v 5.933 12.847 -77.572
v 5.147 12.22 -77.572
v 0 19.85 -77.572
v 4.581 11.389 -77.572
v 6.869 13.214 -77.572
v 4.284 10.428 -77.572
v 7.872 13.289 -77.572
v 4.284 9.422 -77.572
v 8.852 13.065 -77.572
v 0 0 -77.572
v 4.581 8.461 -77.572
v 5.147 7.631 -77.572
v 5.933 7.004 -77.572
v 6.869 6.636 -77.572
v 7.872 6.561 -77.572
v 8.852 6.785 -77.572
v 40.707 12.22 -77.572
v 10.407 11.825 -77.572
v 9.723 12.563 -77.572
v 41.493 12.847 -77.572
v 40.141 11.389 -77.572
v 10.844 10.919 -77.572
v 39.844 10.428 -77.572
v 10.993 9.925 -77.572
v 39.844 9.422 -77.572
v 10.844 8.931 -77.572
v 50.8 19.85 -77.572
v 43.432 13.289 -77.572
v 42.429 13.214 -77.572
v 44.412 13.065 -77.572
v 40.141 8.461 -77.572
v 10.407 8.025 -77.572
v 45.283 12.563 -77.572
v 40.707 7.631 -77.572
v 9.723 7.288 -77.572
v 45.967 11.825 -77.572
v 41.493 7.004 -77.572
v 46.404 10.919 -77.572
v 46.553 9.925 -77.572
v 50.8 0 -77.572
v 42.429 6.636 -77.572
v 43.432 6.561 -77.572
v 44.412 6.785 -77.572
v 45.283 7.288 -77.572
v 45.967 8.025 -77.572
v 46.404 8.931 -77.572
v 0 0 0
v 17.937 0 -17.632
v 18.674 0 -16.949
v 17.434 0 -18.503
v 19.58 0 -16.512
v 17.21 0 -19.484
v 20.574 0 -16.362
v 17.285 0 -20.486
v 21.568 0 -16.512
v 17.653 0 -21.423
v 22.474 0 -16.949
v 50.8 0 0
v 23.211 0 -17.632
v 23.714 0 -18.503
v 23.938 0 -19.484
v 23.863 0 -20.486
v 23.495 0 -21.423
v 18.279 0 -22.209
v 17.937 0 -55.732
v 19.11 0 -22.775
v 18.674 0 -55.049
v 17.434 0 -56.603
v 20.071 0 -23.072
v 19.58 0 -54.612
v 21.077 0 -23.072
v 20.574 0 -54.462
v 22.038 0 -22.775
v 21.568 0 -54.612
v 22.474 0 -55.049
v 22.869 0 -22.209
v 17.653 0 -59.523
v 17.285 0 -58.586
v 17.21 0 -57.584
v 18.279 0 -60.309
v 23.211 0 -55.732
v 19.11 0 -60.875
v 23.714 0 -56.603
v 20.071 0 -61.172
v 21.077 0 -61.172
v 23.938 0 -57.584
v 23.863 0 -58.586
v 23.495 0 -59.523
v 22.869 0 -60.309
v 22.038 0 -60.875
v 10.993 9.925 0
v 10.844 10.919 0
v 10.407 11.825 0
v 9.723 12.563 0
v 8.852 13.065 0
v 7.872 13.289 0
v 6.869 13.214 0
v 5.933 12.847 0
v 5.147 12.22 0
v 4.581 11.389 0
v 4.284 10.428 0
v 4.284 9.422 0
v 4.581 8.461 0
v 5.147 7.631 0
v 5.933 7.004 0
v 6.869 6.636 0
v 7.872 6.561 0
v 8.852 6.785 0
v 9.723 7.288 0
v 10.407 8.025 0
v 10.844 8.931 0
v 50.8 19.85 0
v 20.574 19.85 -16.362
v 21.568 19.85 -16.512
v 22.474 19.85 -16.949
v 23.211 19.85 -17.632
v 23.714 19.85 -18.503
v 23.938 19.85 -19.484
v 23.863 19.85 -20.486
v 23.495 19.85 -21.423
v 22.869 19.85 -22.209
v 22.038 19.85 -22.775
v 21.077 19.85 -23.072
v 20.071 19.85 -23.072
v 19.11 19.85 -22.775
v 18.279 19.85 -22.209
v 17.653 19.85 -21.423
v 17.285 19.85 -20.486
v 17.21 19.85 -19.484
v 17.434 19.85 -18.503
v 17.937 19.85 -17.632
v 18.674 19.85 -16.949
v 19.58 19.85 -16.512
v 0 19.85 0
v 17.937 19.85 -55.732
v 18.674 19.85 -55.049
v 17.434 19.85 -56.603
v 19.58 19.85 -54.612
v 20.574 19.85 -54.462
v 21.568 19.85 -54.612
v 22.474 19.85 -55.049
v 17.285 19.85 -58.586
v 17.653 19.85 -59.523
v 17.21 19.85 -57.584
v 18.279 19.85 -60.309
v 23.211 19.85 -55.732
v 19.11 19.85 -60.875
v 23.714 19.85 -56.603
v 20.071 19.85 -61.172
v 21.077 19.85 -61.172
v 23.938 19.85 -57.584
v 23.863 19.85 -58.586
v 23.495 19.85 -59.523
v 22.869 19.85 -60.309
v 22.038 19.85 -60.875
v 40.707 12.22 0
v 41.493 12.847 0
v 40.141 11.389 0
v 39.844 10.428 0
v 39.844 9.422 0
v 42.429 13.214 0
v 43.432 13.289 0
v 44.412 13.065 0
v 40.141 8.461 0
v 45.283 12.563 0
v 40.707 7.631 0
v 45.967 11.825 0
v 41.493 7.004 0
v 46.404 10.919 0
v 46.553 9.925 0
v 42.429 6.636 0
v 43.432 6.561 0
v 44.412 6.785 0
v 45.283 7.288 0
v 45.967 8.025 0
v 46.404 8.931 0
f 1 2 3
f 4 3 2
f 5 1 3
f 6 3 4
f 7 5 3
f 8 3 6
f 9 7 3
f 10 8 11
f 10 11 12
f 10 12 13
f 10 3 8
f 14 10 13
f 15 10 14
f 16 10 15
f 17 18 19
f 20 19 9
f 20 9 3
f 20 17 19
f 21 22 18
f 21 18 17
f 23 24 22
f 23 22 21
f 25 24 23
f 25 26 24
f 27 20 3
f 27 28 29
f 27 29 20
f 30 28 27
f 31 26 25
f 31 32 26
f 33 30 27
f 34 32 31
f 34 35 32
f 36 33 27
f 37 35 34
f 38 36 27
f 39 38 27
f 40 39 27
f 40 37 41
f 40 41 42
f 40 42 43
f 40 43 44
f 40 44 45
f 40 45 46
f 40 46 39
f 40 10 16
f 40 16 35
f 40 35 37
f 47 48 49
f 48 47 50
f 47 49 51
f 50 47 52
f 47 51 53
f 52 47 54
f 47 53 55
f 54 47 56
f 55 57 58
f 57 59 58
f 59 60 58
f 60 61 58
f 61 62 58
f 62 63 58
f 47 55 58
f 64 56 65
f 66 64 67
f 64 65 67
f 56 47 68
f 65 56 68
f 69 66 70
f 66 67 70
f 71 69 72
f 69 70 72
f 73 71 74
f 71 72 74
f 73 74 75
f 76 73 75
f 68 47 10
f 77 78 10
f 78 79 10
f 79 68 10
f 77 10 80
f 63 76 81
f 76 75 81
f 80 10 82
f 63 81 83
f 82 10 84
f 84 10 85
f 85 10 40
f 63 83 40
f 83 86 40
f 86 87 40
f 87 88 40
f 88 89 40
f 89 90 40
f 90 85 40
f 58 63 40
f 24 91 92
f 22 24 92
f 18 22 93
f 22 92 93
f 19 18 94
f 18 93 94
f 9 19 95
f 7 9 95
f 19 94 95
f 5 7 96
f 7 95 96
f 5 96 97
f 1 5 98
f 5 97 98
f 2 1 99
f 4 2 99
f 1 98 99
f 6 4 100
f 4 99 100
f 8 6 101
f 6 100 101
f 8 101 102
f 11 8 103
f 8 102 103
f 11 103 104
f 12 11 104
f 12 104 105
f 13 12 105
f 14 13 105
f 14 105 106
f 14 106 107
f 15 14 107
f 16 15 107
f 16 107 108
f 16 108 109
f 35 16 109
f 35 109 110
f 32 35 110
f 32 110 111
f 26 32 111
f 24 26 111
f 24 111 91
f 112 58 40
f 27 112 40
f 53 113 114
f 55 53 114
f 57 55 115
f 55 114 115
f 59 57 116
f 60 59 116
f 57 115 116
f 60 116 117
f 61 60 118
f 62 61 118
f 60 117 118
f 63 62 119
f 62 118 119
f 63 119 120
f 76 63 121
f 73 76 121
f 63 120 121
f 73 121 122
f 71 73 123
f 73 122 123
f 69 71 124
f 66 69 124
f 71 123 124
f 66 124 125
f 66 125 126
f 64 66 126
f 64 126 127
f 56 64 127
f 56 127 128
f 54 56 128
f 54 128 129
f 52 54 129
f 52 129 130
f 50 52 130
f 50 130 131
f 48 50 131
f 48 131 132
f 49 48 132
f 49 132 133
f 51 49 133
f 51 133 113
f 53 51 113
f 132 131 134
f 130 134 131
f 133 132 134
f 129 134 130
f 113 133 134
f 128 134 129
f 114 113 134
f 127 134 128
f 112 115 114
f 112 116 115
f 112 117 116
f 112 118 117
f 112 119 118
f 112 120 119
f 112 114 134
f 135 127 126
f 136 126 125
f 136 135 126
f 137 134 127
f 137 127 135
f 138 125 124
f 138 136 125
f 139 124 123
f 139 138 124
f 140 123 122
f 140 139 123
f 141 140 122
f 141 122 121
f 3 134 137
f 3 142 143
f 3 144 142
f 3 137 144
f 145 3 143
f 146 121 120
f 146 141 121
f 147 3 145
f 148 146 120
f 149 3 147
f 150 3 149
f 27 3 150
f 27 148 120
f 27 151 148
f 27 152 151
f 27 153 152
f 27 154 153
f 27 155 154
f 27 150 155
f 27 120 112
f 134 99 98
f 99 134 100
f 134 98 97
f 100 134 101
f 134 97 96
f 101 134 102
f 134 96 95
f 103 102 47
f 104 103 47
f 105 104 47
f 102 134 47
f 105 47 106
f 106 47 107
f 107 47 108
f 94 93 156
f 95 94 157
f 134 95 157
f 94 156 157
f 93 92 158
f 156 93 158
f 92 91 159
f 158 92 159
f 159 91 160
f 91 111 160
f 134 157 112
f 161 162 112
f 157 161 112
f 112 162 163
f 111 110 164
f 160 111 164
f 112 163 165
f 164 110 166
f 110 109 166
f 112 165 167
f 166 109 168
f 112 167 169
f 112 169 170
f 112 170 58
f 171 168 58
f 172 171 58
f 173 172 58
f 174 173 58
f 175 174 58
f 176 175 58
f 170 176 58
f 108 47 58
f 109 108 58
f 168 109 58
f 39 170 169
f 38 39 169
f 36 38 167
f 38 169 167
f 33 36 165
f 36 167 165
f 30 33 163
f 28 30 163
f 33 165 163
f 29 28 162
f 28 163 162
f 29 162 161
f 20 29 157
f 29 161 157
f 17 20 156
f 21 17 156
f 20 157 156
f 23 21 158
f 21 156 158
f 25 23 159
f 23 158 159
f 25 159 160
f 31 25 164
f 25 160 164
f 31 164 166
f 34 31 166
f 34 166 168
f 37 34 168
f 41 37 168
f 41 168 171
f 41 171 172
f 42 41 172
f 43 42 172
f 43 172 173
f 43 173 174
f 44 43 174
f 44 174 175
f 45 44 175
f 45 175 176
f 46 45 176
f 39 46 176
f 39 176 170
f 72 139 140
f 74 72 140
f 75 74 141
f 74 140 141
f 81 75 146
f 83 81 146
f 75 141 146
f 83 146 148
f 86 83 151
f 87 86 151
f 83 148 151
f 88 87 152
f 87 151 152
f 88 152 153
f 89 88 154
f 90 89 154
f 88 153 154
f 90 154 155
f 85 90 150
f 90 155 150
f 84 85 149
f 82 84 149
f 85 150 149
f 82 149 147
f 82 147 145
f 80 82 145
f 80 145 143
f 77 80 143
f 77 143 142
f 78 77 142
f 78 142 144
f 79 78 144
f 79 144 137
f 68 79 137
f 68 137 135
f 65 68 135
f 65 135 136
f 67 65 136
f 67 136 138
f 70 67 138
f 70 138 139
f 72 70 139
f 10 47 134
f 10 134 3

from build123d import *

# Parameters (mm, degrees)
SKETCH1_W           = 50.8
SKETCH1_H           = 77.5716
BOSS_EXTRUDE1_DEPTH = 19.8501
SKETCH2_R           = 3.3734375
CUT_EXTRUDE1_DEPTH  = 95.826260058
SKETCH3_R           = 3.3734375
CUT_EXTRUDE2_DEPTH  = 95.826260058


with BuildPart() as part:
    # Sketch1 → Boss-Extrude1 (new body)
    with BuildSketch(Plane(origin=(0, 0, 0), x_dir=(1, 0, 0), z_dir=(0, 1, 0))):
        with Locations((25.4, 38.7858)):
            Rectangle(SKETCH1_W, SKETCH1_H)
    extrude(amount=BOSS_EXTRUDE1_DEPTH)

    # Sketch2 → Cut-Extrude1 (cut, through all)
    with BuildSketch(Plane(origin=(0, 19.8501, 0), x_dir=(1, 0, 0), z_dir=(0, 1, 0))):
        with Locations(Location((20.574, 19.735800015, 0), (0, 0, 270))):
            Circle(SKETCH2_R)
        with Locations(Location((20.574, 57.835800015, 0), (0, 0, 270))):
            Circle(SKETCH2_R)
    extrude(amount=-CUT_EXTRUDE1_DEPTH, mode=Mode.SUBTRACT)

    # Sketch3 → Cut-Extrude2 (cut, through all)
    with BuildSketch(Plane.XY):
        with Locations((7.62, 9.92505)):
            Circle(SKETCH3_R)
        with Locations((43.18, 9.92505)):
            Circle(SKETCH3_R)
    extrude(amount=-CUT_EXTRUDE2_DEPTH, mode=Mode.SUBTRACT)


solid = part.part
